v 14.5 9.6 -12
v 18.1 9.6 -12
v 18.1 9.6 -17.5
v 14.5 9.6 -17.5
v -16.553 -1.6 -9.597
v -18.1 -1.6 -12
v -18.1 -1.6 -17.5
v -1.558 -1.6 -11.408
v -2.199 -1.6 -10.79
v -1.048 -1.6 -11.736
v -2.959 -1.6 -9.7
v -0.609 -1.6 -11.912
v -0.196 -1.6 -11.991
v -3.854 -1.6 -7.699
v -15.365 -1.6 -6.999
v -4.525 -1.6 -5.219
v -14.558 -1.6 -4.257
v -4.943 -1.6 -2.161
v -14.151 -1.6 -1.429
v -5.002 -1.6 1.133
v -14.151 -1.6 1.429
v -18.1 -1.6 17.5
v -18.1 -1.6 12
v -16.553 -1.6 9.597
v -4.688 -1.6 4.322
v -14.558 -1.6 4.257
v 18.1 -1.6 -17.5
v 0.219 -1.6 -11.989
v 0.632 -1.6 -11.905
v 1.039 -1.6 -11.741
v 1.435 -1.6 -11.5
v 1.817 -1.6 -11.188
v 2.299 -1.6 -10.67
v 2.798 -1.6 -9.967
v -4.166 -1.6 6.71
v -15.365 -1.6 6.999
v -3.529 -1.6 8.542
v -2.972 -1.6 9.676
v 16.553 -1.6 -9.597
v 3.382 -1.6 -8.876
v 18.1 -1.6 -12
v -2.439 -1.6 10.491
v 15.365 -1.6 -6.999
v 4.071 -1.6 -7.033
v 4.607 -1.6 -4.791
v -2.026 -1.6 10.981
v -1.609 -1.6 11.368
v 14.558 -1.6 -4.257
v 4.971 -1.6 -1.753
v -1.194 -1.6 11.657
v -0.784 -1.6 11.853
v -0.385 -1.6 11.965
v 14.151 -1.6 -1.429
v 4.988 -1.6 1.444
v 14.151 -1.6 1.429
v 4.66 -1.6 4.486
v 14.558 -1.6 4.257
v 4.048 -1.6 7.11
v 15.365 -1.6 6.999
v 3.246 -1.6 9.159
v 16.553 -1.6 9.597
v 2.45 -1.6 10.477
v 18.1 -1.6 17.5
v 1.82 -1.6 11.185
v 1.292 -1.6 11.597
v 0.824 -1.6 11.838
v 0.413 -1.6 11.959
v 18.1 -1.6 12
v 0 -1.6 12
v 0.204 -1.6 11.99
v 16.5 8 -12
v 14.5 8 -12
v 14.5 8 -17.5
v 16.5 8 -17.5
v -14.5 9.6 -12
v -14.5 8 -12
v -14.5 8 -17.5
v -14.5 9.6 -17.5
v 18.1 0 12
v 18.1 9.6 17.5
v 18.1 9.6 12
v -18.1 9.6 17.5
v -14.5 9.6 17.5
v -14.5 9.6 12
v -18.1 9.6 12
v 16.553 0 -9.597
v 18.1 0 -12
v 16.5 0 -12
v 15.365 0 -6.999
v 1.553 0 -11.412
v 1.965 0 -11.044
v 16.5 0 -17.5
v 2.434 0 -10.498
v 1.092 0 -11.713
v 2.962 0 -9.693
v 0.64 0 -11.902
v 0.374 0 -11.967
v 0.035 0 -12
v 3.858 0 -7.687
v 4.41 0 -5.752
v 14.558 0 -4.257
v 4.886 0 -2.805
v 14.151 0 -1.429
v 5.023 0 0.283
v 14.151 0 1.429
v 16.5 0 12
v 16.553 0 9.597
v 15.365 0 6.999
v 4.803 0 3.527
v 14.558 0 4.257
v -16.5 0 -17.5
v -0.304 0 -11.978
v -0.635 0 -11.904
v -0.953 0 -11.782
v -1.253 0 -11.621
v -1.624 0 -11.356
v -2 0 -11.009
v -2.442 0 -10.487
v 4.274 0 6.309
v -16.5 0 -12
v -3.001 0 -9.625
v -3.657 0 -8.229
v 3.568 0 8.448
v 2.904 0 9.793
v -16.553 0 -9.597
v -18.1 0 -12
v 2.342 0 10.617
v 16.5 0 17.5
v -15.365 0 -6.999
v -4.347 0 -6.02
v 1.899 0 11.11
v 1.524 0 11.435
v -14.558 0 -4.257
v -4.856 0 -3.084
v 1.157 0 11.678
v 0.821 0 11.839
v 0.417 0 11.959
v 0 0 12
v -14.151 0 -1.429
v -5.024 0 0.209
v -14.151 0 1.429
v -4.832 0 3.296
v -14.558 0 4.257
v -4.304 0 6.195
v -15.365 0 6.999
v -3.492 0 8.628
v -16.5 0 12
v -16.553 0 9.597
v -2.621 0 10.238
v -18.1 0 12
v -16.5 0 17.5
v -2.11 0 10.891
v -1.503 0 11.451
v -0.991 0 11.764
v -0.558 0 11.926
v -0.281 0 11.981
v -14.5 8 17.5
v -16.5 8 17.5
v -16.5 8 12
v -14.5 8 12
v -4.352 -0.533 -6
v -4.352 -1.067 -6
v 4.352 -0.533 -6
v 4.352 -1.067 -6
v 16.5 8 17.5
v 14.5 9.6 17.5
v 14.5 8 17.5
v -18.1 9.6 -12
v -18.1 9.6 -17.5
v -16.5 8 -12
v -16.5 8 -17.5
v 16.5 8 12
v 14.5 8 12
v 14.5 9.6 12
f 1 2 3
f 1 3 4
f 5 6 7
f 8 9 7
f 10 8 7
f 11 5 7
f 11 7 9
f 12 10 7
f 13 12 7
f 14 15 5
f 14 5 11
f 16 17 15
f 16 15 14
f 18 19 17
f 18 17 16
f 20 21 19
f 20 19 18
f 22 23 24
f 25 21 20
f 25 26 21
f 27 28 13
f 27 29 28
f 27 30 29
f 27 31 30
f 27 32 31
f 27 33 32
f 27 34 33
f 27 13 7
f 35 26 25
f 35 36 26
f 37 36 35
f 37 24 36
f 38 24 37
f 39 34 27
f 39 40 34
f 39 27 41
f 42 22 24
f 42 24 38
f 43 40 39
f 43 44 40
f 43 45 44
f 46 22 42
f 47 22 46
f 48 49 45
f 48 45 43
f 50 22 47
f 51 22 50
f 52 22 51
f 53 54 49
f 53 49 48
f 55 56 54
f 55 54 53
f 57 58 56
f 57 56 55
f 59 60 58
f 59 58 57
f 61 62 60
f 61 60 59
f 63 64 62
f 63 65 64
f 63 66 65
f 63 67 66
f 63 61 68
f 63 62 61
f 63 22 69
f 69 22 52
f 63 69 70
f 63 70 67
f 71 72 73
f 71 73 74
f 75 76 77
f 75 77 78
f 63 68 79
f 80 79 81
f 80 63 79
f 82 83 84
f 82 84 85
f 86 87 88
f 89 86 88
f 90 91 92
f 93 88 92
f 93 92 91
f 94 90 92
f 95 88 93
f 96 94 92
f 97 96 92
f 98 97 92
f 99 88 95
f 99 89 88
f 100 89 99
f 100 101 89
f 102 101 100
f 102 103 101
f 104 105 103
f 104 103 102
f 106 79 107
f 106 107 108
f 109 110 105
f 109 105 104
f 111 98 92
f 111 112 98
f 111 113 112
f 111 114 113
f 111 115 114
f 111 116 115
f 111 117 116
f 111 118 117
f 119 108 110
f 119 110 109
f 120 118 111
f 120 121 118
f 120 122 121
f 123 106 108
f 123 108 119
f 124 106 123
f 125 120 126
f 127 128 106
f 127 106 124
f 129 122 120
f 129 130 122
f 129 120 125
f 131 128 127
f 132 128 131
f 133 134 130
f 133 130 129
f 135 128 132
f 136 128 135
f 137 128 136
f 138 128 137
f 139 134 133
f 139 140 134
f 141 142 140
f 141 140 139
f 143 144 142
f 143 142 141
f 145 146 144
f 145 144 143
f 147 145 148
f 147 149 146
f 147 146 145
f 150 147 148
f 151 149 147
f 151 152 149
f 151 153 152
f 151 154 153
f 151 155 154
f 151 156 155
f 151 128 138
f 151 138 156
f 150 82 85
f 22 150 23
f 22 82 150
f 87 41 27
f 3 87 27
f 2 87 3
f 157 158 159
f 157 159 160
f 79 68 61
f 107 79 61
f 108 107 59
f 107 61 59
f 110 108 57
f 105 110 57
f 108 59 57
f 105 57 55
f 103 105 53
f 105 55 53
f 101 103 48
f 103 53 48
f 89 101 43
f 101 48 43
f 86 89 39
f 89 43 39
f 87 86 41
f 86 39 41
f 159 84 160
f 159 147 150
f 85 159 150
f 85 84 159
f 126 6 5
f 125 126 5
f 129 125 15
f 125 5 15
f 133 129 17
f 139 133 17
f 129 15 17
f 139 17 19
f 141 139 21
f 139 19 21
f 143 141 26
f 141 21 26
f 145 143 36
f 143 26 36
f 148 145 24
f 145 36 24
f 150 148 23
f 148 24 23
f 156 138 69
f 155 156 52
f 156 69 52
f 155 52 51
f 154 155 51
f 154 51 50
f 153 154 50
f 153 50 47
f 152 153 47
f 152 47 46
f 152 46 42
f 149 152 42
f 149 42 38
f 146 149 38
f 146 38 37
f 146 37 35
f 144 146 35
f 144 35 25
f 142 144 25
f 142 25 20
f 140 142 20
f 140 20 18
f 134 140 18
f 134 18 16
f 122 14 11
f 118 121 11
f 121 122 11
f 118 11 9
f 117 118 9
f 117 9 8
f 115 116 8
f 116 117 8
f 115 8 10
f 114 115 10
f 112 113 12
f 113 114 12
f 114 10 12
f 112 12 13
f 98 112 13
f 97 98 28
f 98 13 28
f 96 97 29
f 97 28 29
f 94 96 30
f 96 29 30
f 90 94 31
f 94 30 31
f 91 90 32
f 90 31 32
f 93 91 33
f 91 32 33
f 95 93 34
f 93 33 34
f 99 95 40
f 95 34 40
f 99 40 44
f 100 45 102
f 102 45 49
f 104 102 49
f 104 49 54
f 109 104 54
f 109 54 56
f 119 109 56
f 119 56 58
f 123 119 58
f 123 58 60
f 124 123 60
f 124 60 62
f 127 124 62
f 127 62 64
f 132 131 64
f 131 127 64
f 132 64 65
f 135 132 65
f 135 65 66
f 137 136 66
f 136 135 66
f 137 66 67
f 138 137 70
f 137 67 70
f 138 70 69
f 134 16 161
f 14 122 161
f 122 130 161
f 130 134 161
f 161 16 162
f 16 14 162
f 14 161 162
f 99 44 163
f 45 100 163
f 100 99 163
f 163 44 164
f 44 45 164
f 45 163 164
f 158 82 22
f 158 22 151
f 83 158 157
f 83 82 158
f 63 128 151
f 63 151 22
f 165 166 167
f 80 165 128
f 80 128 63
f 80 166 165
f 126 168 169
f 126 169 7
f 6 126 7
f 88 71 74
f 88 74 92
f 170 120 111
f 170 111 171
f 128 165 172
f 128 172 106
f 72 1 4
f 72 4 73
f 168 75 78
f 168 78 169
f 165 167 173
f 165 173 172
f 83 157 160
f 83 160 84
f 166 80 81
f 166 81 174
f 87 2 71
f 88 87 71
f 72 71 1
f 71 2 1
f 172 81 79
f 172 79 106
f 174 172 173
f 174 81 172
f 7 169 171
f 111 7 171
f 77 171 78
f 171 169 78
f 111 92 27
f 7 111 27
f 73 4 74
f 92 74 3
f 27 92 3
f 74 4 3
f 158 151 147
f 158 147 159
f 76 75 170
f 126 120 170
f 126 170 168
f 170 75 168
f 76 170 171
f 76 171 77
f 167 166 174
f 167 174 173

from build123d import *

# Parameters (mm, degrees)
F1_DEPTH = 17.5
F3_DEPTH = 25
F4_W     = 3.6
F4_H     = 24
F5_DEPTH = 9.6


with BuildPart() as f1:
    # F0 (on Top) → F1 (new body, symmetric)
    with BuildSketch(Plane.XY):
        Polygon((-16.5, 0), (-16.5, 8), (-14.5, 8), (-14.5, 9.6), (-18.1, 9.6), (-18.1, -1.6), (18.1, -1.6), (18.1, 9.6), (14.5, 9.6), (14.5, 8), (16.5, 8), (16.5, 0), align=None)
    extrude(amount=F1_DEPTH, both=True)

    # F2 (on face) → F3 (cut)
    with BuildSketch(Plane.XZ.offset(1.6)):
        with BuildLine():
            Line((-18.1, 12), (-18.1, -12))
            ThreePointArc((-18.1, -12), (-14.1, 0), (-18.1, 12))
        make_face()
        with BuildLine():
            Line((18.1, -12), (18.1, 12))
            ThreePointArc((18.1, 12), (14.1, 0), (18.1, -12))
        make_face()
        with BuildLine():
            add(Edge.make_bspline(
                [(0, 12), (-8.70323, 12), (-4.351615, -6), (0, -24), (4.351615, -6), (8.70323, 12), (0, 12)],
                knots=[0, 0, 0, 2.094395, 2.094395, 4.18879, 4.18879, 6.283185, 6.283185, 6.283185], degree=2, weights=[1, 0.5, 1, 0.5, 1, 0.5, 1]))
        make_face()
    extrude(amount=-F3_DEPTH, mode=Mode.SUBTRACT)

    # F4 (on face) → F5 (cut, through all)
    with BuildSketch(Plane(origin=(0, 9.6, 0), x_dir=(-1, 0, 0), z_dir=(0, 1, 0))):
        with Locations((-16.3, 0)):
            Rectangle(F4_W, F4_H)
        with Locations((16.3, 0)):
            Rectangle(F4_W, F4_H)
    extrude(amount=-F5_DEPTH, mode=Mode.SUBTRACT)


solid = f1.part
